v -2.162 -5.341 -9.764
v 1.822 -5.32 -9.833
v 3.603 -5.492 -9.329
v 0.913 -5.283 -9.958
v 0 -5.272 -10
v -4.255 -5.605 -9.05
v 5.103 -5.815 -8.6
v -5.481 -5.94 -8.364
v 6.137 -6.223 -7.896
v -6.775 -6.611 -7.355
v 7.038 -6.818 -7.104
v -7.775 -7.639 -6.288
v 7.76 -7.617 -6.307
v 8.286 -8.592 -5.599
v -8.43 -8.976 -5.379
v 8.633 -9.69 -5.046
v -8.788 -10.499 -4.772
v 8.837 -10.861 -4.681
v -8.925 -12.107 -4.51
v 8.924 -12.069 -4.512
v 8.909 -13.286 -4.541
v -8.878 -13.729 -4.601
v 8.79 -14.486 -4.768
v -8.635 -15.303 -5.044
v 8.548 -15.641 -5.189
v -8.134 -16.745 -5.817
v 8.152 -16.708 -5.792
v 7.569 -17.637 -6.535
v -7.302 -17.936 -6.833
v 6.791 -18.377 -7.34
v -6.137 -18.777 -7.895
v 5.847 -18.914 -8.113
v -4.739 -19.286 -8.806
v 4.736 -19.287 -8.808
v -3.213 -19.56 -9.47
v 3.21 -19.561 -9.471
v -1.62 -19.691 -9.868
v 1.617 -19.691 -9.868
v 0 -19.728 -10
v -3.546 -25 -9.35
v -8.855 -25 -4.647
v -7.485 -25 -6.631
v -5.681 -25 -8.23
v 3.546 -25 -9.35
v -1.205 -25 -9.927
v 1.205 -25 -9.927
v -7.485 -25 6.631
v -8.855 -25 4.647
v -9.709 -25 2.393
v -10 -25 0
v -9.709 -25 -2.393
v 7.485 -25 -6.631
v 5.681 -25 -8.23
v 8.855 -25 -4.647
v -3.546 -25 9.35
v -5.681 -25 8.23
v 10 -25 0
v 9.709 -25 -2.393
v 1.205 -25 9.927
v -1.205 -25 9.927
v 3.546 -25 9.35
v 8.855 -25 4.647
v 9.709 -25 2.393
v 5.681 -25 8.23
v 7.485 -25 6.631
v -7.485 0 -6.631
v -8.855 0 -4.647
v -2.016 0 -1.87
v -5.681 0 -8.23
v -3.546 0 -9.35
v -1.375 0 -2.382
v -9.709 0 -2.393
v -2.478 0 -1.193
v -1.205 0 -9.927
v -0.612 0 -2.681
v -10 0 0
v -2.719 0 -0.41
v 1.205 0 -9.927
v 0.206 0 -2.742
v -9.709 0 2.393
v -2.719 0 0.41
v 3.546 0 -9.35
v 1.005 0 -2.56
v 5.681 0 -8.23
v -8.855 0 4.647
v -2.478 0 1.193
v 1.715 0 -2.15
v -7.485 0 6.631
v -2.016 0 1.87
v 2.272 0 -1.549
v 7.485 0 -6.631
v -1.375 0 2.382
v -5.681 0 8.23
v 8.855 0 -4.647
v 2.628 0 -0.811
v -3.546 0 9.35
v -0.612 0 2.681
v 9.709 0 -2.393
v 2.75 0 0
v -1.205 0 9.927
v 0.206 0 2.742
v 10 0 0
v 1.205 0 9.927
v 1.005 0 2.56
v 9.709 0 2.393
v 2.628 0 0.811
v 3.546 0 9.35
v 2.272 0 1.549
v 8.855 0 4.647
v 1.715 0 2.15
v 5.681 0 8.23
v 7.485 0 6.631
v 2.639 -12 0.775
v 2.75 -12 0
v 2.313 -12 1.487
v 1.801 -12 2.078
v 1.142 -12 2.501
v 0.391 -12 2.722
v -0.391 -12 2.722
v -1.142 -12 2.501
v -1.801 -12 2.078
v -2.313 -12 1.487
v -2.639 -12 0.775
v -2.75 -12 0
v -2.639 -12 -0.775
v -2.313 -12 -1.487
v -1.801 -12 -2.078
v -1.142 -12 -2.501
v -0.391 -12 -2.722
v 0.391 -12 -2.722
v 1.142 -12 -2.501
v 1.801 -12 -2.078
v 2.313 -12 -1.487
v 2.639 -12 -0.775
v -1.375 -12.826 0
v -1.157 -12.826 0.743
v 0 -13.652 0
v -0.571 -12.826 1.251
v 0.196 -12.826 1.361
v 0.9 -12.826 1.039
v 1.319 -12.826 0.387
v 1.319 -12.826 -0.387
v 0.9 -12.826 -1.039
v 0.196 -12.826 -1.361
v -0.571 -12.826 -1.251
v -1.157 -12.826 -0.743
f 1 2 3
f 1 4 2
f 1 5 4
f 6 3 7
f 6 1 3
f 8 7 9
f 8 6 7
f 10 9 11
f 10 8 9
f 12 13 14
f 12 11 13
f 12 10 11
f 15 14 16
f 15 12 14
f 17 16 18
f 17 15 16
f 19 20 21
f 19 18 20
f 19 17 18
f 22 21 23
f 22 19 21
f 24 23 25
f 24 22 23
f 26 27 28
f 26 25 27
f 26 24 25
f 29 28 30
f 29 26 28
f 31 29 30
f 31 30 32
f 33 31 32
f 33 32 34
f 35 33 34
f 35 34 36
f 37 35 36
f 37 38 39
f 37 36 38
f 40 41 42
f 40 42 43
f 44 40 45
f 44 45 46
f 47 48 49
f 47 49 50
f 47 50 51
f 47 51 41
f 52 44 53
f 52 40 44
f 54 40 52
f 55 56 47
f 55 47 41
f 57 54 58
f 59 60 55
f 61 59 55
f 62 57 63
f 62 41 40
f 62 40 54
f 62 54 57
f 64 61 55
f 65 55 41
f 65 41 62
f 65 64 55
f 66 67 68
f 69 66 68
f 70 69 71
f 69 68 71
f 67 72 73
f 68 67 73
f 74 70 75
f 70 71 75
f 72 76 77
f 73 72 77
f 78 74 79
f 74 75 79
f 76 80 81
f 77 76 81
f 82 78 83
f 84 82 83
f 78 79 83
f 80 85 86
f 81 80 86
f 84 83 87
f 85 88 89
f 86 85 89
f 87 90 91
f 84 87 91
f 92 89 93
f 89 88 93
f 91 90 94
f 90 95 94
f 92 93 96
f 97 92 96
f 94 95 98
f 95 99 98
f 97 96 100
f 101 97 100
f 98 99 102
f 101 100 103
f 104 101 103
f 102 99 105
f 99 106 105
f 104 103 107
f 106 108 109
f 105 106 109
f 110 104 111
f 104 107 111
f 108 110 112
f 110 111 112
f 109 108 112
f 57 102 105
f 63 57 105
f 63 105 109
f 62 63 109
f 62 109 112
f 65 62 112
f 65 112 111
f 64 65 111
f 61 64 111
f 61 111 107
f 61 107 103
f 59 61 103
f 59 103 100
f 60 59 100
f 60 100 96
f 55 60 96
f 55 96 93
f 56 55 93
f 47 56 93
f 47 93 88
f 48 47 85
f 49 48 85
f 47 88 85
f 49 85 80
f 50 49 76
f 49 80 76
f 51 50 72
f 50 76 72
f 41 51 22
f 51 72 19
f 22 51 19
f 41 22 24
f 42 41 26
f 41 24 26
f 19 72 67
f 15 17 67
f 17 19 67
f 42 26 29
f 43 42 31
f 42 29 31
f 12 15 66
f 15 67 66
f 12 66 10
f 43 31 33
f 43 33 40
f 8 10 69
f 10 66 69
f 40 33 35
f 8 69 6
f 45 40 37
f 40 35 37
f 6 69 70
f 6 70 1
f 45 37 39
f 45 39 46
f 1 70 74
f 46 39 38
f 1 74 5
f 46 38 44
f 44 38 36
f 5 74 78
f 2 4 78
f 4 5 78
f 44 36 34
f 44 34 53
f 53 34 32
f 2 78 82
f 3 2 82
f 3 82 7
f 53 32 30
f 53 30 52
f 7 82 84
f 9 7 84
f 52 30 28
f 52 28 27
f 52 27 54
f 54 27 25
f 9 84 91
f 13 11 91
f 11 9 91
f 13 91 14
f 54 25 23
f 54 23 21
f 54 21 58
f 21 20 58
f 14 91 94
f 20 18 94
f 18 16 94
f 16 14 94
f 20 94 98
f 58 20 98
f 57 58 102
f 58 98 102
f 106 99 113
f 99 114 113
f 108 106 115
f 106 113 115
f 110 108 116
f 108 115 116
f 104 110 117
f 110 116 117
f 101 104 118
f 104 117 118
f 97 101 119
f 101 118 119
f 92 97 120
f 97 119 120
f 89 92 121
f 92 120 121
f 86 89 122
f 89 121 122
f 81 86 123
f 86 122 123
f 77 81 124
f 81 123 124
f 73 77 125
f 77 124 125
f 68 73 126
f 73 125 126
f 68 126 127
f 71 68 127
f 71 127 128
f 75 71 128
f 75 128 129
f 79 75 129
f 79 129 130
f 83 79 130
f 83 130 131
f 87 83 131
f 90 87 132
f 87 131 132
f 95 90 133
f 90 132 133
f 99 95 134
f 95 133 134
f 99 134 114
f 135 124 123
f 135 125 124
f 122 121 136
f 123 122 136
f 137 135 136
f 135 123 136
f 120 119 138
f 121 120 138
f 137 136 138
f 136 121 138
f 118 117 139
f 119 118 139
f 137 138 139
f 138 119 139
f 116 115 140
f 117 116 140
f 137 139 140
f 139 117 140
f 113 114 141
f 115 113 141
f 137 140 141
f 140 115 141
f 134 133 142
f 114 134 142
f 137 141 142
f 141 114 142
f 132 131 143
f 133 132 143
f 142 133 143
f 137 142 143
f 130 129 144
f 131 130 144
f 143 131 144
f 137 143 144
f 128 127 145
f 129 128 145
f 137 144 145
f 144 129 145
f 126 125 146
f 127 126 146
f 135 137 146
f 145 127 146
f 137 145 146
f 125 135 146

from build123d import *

# Parameters (mm, degrees)
F0_R          = 10
F1_DEPTH      = 25
F2_R          = 7.5
F3_DEPTH      = 10.001
F3_DEPTH_BACK = 10.001
F5_D          = 5.5
F5_DEPTH      = 12
F5_TIP        = 1.6523667023


with BuildPart() as f1:
    # F0 (on Front) → F1 (new body)
    with BuildSketch(Plane.XZ):
        Circle(F0_R)
    extrude(amount=F1_DEPTH)

    # F2 (on Right) → F3 (cut, two sides)
    with BuildSketch(Plane.YZ) as f3_sk:
        with Locations((-12.5, -12)):
            Circle(F2_R)
    extrude(amount=F3_DEPTH, mode=Mode.SUBTRACT)
    extrude(f3_sk.sketch, amount=-F3_DEPTH_BACK, mode=Mode.SUBTRACT)

    # F5
    with Locations(Plane(origin=(0, 0, 0), x_dir=(-1, 0, 0), z_dir=(0, 1, 0))):
        with Locations((0, 0)):
            Hole(F5_D / 2, depth=F5_DEPTH)
            with Locations((0, 0, -(F5_DEPTH + F5_TIP / 2))):  # 118° drill point
                Cone(0, F5_D / 2, F5_TIP, mode=Mode.SUBTRACT)


solid = f1.part
